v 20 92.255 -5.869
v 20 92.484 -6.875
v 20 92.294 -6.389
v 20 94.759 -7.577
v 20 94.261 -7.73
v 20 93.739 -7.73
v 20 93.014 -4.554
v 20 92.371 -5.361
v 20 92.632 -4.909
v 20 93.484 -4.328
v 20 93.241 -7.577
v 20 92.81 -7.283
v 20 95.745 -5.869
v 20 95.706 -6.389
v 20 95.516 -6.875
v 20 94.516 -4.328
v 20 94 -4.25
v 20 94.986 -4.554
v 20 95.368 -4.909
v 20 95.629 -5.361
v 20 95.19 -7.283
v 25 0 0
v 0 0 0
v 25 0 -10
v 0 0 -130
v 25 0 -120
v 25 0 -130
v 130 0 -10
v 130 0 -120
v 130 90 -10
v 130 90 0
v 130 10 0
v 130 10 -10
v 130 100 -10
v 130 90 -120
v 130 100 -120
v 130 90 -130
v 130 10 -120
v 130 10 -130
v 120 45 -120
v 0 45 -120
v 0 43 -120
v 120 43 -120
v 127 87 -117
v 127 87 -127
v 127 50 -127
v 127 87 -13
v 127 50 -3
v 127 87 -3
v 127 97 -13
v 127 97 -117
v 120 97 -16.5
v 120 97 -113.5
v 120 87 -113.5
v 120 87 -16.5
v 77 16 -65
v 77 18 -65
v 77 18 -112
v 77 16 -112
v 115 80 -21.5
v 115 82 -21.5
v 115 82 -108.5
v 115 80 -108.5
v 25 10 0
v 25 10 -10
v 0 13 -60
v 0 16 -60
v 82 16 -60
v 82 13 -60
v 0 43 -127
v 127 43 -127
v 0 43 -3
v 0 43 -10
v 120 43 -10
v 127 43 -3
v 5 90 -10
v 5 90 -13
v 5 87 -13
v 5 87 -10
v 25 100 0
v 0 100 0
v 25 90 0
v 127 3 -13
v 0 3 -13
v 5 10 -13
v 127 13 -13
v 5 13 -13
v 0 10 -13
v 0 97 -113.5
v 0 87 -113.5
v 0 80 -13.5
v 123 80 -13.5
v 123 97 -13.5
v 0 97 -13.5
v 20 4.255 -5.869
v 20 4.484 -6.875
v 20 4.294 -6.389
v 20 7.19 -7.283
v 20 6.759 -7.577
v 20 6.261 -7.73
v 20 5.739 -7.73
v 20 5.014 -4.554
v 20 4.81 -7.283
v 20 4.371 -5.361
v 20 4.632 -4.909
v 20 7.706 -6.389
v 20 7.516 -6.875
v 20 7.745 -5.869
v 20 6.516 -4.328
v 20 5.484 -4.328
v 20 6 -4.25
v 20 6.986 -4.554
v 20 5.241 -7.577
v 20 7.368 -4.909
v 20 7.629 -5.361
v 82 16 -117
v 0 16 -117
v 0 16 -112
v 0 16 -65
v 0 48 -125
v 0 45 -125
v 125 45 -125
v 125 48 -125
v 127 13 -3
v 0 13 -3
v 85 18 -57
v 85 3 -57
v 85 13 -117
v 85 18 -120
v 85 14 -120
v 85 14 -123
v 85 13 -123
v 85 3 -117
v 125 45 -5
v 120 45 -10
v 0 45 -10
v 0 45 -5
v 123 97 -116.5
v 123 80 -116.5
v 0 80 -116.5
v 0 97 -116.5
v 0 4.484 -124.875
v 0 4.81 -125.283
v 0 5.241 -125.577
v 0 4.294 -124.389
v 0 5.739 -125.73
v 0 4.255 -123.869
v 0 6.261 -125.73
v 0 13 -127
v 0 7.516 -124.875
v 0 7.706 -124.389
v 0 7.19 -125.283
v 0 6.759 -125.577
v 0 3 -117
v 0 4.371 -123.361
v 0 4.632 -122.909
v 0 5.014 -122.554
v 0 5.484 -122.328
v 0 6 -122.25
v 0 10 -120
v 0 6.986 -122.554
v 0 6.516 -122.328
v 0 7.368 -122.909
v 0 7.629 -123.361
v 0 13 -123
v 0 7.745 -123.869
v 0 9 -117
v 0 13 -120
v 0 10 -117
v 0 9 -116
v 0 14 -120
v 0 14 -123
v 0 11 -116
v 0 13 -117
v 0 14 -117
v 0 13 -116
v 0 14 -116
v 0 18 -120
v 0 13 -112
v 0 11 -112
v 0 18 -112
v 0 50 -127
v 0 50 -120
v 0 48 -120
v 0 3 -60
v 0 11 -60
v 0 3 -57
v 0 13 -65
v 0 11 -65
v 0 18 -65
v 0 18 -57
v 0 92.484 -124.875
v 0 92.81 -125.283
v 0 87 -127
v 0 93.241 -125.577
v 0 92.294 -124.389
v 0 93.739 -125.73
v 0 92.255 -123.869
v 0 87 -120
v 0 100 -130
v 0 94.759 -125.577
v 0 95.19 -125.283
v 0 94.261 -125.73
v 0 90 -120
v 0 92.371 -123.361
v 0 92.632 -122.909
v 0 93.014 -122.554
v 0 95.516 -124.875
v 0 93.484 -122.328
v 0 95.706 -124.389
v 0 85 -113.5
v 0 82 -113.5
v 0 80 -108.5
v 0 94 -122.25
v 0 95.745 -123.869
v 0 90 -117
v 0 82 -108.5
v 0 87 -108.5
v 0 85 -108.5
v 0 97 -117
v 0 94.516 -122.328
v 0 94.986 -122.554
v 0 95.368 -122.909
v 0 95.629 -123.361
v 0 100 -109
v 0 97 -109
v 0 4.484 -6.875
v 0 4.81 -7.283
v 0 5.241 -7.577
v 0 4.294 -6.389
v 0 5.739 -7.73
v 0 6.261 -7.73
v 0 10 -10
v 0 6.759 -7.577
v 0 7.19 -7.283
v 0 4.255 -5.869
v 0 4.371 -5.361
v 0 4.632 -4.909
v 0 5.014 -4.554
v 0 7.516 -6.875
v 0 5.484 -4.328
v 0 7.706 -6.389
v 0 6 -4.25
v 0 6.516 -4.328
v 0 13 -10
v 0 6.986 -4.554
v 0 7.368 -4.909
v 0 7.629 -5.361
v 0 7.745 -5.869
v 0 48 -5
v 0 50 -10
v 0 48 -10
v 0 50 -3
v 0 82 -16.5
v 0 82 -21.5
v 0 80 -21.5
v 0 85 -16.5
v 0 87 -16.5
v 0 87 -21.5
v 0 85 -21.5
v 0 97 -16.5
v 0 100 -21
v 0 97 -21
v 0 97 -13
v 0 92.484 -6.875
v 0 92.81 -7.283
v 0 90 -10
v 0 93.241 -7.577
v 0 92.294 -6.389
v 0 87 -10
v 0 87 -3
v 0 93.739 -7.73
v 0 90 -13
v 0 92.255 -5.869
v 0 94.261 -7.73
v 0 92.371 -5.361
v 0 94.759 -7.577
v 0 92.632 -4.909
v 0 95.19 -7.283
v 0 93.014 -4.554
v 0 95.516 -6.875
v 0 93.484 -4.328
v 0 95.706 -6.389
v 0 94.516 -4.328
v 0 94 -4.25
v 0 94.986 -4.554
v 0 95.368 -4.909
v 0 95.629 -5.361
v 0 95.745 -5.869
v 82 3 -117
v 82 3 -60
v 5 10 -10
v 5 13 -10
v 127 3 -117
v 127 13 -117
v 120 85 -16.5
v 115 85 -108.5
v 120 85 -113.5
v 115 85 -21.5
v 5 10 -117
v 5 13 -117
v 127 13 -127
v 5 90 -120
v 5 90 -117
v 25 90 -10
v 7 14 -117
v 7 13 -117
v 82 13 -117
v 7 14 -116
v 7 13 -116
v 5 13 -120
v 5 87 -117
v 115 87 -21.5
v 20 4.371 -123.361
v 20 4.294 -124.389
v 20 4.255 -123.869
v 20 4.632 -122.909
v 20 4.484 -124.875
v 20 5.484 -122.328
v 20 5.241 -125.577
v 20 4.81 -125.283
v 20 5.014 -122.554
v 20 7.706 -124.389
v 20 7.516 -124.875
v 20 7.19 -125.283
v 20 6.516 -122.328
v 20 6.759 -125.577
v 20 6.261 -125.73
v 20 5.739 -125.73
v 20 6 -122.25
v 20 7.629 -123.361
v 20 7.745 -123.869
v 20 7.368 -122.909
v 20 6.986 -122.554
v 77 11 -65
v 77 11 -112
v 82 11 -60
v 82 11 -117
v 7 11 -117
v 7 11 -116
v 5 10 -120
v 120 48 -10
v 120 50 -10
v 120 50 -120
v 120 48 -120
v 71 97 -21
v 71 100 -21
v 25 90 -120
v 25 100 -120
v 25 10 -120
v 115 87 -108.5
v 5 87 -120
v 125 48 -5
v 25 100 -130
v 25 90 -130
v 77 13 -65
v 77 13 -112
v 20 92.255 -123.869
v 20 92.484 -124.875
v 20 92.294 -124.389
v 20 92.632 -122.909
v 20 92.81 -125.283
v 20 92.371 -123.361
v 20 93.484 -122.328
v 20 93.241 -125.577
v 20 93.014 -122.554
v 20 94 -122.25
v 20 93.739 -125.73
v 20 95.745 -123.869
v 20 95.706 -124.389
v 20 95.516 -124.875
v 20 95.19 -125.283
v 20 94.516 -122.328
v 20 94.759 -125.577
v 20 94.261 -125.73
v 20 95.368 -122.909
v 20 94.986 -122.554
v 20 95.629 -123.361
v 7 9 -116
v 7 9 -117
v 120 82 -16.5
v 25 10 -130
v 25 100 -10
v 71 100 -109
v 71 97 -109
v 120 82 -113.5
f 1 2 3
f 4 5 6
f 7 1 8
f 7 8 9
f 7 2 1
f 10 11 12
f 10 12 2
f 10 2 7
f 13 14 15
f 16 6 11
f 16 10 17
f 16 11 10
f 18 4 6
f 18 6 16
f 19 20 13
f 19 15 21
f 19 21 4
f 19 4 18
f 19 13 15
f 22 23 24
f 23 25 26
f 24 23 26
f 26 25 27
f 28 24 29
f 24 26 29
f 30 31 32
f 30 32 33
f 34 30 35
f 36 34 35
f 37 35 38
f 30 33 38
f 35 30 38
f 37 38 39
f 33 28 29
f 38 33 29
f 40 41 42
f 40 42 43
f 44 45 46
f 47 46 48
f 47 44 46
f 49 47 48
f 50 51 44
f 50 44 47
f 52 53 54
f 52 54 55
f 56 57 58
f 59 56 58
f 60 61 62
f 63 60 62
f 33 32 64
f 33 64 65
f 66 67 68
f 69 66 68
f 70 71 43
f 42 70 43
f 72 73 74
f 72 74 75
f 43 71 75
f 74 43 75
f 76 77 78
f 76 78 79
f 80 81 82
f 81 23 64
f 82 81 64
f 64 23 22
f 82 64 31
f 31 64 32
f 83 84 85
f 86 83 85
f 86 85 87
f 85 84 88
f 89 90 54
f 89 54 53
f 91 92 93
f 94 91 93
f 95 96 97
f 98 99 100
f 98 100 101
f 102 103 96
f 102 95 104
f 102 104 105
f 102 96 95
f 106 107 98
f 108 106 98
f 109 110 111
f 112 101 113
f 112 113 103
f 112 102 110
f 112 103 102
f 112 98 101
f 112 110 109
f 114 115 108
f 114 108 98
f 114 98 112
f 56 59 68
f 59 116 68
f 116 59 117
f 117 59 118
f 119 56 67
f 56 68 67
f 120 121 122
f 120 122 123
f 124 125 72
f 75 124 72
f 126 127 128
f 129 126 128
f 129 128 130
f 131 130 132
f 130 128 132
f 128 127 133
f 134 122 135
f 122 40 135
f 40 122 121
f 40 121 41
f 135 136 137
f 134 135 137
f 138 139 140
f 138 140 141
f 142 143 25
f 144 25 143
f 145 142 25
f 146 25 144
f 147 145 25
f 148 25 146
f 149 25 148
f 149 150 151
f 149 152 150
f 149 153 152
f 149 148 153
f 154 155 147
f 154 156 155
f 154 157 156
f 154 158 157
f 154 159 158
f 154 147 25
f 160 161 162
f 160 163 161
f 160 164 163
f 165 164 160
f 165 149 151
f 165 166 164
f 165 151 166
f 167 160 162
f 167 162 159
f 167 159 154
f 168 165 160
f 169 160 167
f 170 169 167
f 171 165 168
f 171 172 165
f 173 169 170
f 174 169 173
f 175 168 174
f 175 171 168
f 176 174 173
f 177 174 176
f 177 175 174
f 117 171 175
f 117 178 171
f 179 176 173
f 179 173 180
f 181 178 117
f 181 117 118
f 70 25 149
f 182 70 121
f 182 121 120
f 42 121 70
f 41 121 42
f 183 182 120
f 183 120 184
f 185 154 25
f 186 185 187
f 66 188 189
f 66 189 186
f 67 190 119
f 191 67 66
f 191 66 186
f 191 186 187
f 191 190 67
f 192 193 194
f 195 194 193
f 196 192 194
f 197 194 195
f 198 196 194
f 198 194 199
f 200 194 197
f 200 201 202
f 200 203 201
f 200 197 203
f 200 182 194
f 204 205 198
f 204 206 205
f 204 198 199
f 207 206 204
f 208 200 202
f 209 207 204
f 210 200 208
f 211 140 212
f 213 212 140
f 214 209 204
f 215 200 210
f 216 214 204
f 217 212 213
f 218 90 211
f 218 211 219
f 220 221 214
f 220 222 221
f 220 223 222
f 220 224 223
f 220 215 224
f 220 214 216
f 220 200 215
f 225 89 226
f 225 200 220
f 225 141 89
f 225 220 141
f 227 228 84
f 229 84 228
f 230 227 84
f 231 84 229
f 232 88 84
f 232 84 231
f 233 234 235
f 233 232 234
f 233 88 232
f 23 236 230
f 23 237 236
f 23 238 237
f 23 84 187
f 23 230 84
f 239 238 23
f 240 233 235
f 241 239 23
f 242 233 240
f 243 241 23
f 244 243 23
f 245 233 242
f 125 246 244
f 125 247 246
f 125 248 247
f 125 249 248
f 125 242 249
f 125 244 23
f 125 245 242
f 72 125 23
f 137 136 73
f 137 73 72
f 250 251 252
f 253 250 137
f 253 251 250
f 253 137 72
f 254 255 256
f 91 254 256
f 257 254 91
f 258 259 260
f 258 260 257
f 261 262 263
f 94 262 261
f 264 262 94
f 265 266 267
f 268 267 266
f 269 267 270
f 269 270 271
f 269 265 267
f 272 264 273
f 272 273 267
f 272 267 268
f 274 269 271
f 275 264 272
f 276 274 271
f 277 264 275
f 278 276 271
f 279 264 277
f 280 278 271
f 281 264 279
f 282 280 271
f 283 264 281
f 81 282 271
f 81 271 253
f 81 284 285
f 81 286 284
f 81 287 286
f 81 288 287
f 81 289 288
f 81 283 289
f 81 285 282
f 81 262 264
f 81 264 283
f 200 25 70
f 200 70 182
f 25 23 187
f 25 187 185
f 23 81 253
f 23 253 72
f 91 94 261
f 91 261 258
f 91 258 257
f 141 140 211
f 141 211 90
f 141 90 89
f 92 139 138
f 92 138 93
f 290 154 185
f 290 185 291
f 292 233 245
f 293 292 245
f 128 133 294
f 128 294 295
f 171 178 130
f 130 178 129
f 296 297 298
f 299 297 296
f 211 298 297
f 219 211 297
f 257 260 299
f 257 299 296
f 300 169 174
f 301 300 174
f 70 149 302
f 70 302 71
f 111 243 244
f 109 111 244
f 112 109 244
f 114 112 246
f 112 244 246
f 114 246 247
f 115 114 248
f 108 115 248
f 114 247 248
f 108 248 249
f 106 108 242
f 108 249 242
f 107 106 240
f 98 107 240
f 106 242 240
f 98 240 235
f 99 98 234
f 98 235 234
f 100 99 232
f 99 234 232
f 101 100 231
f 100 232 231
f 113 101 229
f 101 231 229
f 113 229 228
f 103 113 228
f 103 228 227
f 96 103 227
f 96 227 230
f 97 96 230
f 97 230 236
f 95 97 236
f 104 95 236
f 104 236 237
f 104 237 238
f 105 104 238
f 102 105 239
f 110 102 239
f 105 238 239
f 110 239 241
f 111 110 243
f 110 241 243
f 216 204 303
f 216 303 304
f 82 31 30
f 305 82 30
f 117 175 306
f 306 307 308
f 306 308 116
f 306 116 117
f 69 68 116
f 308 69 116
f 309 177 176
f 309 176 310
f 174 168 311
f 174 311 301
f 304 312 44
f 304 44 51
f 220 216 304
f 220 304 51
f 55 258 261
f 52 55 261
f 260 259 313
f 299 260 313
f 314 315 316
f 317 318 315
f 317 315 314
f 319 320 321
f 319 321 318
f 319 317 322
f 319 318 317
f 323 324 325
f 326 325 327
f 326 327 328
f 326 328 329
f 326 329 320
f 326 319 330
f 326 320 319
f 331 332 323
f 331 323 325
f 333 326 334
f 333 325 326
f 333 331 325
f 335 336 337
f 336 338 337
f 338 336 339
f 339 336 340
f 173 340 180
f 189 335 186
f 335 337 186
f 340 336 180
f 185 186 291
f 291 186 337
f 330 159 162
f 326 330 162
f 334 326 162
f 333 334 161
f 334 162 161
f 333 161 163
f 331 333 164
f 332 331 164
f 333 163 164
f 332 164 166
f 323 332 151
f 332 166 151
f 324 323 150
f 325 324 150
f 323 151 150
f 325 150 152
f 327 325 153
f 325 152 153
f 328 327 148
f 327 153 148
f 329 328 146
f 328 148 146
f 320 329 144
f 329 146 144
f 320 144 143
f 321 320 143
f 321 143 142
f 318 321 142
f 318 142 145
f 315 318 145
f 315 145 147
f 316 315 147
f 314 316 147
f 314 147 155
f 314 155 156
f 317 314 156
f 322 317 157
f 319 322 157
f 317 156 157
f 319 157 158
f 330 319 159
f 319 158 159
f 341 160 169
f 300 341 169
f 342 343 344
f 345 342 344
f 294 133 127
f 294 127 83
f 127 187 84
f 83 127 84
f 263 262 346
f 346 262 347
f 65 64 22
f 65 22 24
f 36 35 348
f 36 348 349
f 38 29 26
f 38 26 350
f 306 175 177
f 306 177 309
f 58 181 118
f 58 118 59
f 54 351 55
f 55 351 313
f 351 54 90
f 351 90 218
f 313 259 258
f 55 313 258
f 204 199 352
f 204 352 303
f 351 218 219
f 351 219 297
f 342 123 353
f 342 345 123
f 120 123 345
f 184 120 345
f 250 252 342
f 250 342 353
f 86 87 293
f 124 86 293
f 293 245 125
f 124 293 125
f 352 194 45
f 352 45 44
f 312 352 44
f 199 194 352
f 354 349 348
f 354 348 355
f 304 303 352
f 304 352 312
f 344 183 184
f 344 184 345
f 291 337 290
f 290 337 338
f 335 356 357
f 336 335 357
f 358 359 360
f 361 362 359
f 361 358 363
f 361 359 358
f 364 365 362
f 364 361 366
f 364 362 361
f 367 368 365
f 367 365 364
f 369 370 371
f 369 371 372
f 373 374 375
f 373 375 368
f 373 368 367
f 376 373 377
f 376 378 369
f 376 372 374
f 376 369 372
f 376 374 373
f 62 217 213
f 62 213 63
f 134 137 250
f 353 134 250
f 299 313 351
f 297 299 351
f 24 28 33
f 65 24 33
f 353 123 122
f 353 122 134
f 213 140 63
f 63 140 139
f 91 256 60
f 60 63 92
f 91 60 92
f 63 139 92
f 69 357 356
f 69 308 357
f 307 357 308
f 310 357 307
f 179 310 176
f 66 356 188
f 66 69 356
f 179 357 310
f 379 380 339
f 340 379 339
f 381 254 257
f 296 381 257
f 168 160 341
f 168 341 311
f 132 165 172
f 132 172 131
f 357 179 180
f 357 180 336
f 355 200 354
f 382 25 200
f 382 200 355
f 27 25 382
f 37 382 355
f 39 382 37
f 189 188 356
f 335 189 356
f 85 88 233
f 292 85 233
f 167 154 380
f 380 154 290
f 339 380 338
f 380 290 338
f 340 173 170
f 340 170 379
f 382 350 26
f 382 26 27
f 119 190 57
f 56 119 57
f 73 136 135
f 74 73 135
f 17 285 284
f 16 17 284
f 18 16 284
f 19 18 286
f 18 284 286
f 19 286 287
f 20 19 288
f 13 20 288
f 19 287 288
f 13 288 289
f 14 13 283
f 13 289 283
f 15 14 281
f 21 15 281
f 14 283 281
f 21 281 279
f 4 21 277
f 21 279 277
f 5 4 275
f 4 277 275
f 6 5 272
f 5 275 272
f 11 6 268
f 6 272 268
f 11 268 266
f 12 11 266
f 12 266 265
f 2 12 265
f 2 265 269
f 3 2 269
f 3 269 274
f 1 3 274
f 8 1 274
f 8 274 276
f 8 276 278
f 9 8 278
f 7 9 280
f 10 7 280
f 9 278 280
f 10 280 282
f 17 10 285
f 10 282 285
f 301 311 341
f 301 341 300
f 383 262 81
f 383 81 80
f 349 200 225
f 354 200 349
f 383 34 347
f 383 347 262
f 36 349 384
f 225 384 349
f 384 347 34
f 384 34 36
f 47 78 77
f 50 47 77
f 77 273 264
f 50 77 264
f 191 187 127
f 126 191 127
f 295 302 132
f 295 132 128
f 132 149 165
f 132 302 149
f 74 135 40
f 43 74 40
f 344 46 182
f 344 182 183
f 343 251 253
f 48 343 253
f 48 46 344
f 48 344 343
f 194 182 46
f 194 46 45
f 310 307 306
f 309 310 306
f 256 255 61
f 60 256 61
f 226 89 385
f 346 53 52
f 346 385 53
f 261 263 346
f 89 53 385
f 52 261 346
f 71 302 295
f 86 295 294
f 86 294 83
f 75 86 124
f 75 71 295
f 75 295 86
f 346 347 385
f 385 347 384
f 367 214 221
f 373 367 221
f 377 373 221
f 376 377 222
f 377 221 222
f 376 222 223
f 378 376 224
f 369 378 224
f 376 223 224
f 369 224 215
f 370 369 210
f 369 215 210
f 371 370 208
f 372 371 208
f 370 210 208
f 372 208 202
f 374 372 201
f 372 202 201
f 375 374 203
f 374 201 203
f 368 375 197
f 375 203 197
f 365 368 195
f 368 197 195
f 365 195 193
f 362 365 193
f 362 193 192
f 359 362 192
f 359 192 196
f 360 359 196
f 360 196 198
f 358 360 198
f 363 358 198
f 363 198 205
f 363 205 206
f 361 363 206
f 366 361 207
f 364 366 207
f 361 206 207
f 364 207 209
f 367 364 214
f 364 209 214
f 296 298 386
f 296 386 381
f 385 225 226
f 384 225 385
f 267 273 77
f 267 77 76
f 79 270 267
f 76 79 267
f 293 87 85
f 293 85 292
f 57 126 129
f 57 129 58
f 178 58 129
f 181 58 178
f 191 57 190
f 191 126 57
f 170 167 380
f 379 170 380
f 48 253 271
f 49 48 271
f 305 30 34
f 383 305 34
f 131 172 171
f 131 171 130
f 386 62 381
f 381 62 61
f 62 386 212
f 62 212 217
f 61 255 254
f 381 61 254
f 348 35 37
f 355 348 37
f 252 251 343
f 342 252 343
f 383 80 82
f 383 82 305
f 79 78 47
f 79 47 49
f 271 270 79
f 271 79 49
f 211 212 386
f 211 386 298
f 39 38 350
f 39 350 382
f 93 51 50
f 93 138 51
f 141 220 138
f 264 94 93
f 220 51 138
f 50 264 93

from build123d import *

# Parameters (mm, degrees)
SKETCH2_W            = 130
SKETCH2_H            = 130
BOSS_EXTRUDE1_DEPTH  = 100
SKETCH3_W            = 104
SKETCH3_H            = 74
CUT_EXTRUDE1_DEPTH   = 127
SKETCH4_W            = 10
SKETCH4_H            = 10
CUT_EXTRUDE3_DEPTH   = 105
SKETCH5_W            = 104
SKETCH5_H            = 10
CUT_EXTRUDE4_DEPTH   = 127
SKETCH6_W            = 10
SKETCH6_H            = 74
CUT_EXTRUDE5_DEPTH   = 127
SKETCH7_R            = 1.75
CUT_EXTRUDE6_DEPTH   = 20
SKETCH8_W            = 3
SKETCH8_H            = 3
CUT_EXTRUDE7_DEPTH   = 5
SKETCH9_W            = 85
SKETCH9_H            = 60
BOSS_EXTRUDE2_DEPTH  = 15
SKETCH11_W           = 85
SKETCH11_H           = 6
BOSS_EXTRUDE5_DEPTH  = 5
SKETCH12_W           = 85
SKETCH12_H           = 3
CUT_EXTRUDE9_DEPTH   = 4
SKETCH13_W           = 82
SKETCH13_H           = 57
CUT_EXTRUDE10_DEPTH  = 15
SKETCH15_W           = 3
SKETCH15_H           = 3
BOSS_EXTRUDE7_DEPTH  = 5
SKETCH16_W           = 82
SKETCH16_H           = 2
BOSS_EXTRUDE8_DEPTH  = 57
SKETCH17_W           = 77
SKETCH17_H           = 47
CUT_EXTRUDE11_DEPTH  = 10
SKETCH19_W           = 7
SKETCH19_H           = 2
SKETCH19_H_2         = 1
BOSS_EXTRUDE9_DEPTH  = 1
SKETCH21_W           = 3
SKETCH21_H           = 3
CUT_EXTRUDE15_DEPTH  = 5
SKETCH22_W           = 124
SKETCH22_H           = 7
BOSS_EXTRUDE10_DEPTH = 127
SKETCH23_W           = 120
SKETCH23_H           = 3
CUT_EXTRUDE16_DEPTH  = 125
SKETCH24_W           = 120
SKETCH24_H           = 110
CUT_EXTRUDE17_DEPTH  = 15
SKETCH25_W           = 71
SKETCH25_H           = 88
CUT_EXTRUDE18_DEPTH  = 15
SKETCH27_W           = 103
SKETCH27_H           = 17
BOSS_EXTRUDE11_DEPTH = 127
SKETCH28_W           = 97
SKETCH28_H           = 3
SKETCH28_H_2         = 10
CUT_EXTRUDE19_DEPTH  = 120
SKETCH29_W           = 4
SKETCH29_H           = 103
CUT_EXTRUDE20_DEPTH  = 17
SKETCH30_W           = 115
SKETCH30_H           = 87
CUT_EXTRUDE21_DEPTH  = 17


with BuildPart() as part:
    # Sketch2 → Boss-Extrude1 (new body)
    with BuildSketch(Plane(origin=(0, 0, 0), x_dir=(1, 0, 0), z_dir=(0, 1, 0))):
        with Locations((65, 65)):
            Rectangle(SKETCH2_W, SKETCH2_H)
    extrude(amount=BOSS_EXTRUDE1_DEPTH)

    # Sketch3 → Cut-Extrude1 (cut)
    with BuildSketch(Plane.ZY):
        with Locations((-65, 50)):
            Rectangle(SKETCH3_W, SKETCH3_H)
    extrude(amount=-CUT_EXTRUDE1_DEPTH, mode=Mode.SUBTRACT)

    # Sketch4 → Cut-Extrude3 (cut)
    with BuildSketch(Plane(origin=(130, 0, 0), x_dir=(0, 0, -1), z_dir=(1, 0, 0))):
        with Locations((5, 95)):
            Rectangle(SKETCH4_W, SKETCH4_H)
        with Locations((125, 95)):
            Rectangle(SKETCH4_W, SKETCH4_H)
        with Locations((5, 5)):
            Rectangle(SKETCH4_W, SKETCH4_H)
        with Locations((125, 5)):
            Rectangle(SKETCH4_W, SKETCH4_H)
    extrude(amount=-CUT_EXTRUDE3_DEPTH, mode=Mode.SUBTRACT)

    # Sketch5 → Cut-Extrude4 (cut)
    with BuildSketch(Plane.ZY):
        with Locations((-65, 92)):
            Rectangle(SKETCH5_W, SKETCH5_H)
        with Locations((-65, 8)):
            Rectangle(SKETCH5_W, SKETCH5_H)
    extrude(amount=-CUT_EXTRUDE4_DEPTH, mode=Mode.SUBTRACT)

    # Sketch6 → Cut-Extrude5 (cut)
    with BuildSketch(Plane.ZY):
        with Locations((-122, 50)):
            Rectangle(SKETCH6_W, SKETCH6_H)
        with Locations((-8, 50)):
            Rectangle(SKETCH6_W, SKETCH6_H)
    extrude(amount=-CUT_EXTRUDE5_DEPTH, mode=Mode.SUBTRACT)

    # Sketch7 → Cut-Extrude6 (cut)
    with BuildSketch(Plane.ZY):
        with Locations((-124, 94)):
            Circle(SKETCH7_R)
        with Locations((-6, 94)):
            Circle(SKETCH7_R)
        with Locations((-124, 6)):
            Circle(SKETCH7_R)
        with Locations((-6, 6)):
            Circle(SKETCH7_R)
    extrude(amount=-CUT_EXTRUDE6_DEPTH, mode=Mode.SUBTRACT)

    # Sketch8 → Cut-Extrude7 (cut)
    with BuildSketch(Plane.ZY):
        with Locations((-118.5, 88.5)):
            Rectangle(SKETCH8_W, SKETCH8_H)
        with Locations((-11.5, 88.5)):
            Rectangle(SKETCH8_W, SKETCH8_H)
        with Locations((-118.5, 11.5)):
            Rectangle(SKETCH8_W, SKETCH8_H)
        with Locations((-11.5, 11.5)):
            Rectangle(SKETCH8_W, SKETCH8_H)
    extrude(amount=-CUT_EXTRUDE7_DEPTH, mode=Mode.SUBTRACT)

    # Sketch9 → Boss-Extrude2 (add)
    with BuildSketch(Plane(origin=(0, 3, 0), x_dir=(1, 0, 0), z_dir=(0, 1, 0))):
        with Locations((42.5, 87)):
            Rectangle(SKETCH9_W, SKETCH9_H)
    extrude(amount=BOSS_EXTRUDE2_DEPTH)

    # Sketch11 → Boss-Extrude5 (add)
    with BuildSketch(Plane(origin=(0, 13, 0), x_dir=(1, 0, 0), z_dir=(0, 1, 0))):
        with Locations((42.5, 120)):
            Rectangle(SKETCH11_W, SKETCH11_H)
    extrude(amount=BOSS_EXTRUDE5_DEPTH)

    # Sketch12 → Cut-Extrude9 (cut)
    with BuildSketch(Plane(origin=(0, 18, 0), x_dir=(1, 0, 0), z_dir=(0, 1, 0))):
        with Locations((42.5, 121.5)):
            Rectangle(SKETCH12_W, SKETCH12_H)
    extrude(amount=-CUT_EXTRUDE9_DEPTH, mode=Mode.SUBTRACT)

    # Sketch13 → Cut-Extrude10 (cut)
    with BuildSketch(Plane(origin=(0, 18, 0), x_dir=(1, 0, 0), z_dir=(0, 1, 0))):
        with Locations((41, 88.5)):
            Rectangle(SKETCH13_W, SKETCH13_H)
    extrude(amount=-CUT_EXTRUDE10_DEPTH, mode=Mode.SUBTRACT)

    # Sketch15 → Boss-Extrude7 (add)
    with BuildSketch(Plane.ZY.offset(-5)):
        with Locations((-118.5, 11.5)):
            Rectangle(SKETCH15_W, SKETCH15_H)
    extrude(amount=BOSS_EXTRUDE7_DEPTH)

    # Sketch16 → Boss-Extrude8 (add)
    with BuildSketch(Plane(origin=(0, 0, -60), x_dir=(-1, 0, 0), z_dir=(0, 0, -1))):
        with Locations((-41, 17)):
            Rectangle(SKETCH16_W, SKETCH16_H)
        with Locations((-41, 12)):
            Rectangle(SKETCH16_W, SKETCH16_H)
    extrude(amount=BOSS_EXTRUDE8_DEPTH)

    # Sketch17 → Cut-Extrude11 (cut)
    with BuildSketch(Plane(origin=(0, 18, 0), x_dir=(1, 0, 0), z_dir=(0, 1, 0))):
        with Locations((38.5, 88.5)):
            Rectangle(SKETCH17_W, SKETCH17_H)
    extrude(amount=-CUT_EXTRUDE11_DEPTH, mode=Mode.SUBTRACT)

    # Sketch19 → Boss-Extrude9 (add)
    with BuildSketch(Plane.XY.offset(-117)):
        with Locations((3.5, 10)):
            Rectangle(SKETCH19_W, SKETCH19_H)
        with Locations((3.5, 13.5)):
            Rectangle(SKETCH19_W, SKETCH19_H_2)
    extrude(amount=BOSS_EXTRUDE9_DEPTH)

    # Sketch21 → Cut-Extrude15 (cut)
    with BuildSketch(Plane.ZY):
        with Locations((-118.5, 11.5)):
            Rectangle(SKETCH21_W, SKETCH21_H)
    extrude(amount=-CUT_EXTRUDE15_DEPTH, mode=Mode.SUBTRACT)

    # Sketch22 → Boss-Extrude10 (add)
    with BuildSketch(Plane.ZY.offset(-127)):
        with Locations((-65, 46.5)):
            Rectangle(SKETCH22_W, SKETCH22_H)
    extrude(amount=BOSS_EXTRUDE10_DEPTH)

    # Sketch23 → Cut-Extrude16 (cut)
    with BuildSketch(Plane.ZY):
        with Locations((-65, 46.5)):
            Rectangle(SKETCH23_W, SKETCH23_H)
    extrude(amount=-CUT_EXTRUDE16_DEPTH, mode=Mode.SUBTRACT)

    # Sketch24 → Cut-Extrude17 (cut)
    with BuildSketch(Plane(origin=(0, 50, 0), x_dir=(1, 0, 0), z_dir=(0, 1, 0))):
        with Locations((60, 65)):
            Rectangle(SKETCH24_W, SKETCH24_H)
    extrude(amount=-CUT_EXTRUDE17_DEPTH, mode=Mode.SUBTRACT)

    # Sketch25 → Cut-Extrude18 (cut)
    with BuildSketch(Plane(origin=(0, 100, 0), x_dir=(1, 0, 0), z_dir=(0, 1, 0))):
        with Locations((35.5, 65)):
            Rectangle(SKETCH25_W, SKETCH25_H)
    extrude(amount=-CUT_EXTRUDE18_DEPTH, mode=Mode.SUBTRACT)

    # Sketch27 → Boss-Extrude11 (add)
    with BuildSketch(Plane.ZY.offset(-127)):
        with Locations((-65, 88.5)):
            Rectangle(SKETCH27_W, SKETCH27_H)
    extrude(amount=BOSS_EXTRUDE11_DEPTH)

    # Sketch28 → Cut-Extrude19 (cut)
    with BuildSketch(Plane.ZY):
        with Locations((-65, 83.5)):
            Rectangle(SKETCH28_W, SKETCH28_H)
        with Locations((-65, 92)):
            Rectangle(SKETCH28_W, SKETCH28_H_2)
    extrude(amount=-CUT_EXTRUDE19_DEPTH, mode=Mode.SUBTRACT)

    # Sketch29 → Cut-Extrude20 (cut)
    with BuildSketch(Plane.XZ.offset(-80)):
        with Locations((125, -65)):
            Rectangle(SKETCH29_W, SKETCH29_H)
    extrude(amount=-CUT_EXTRUDE20_DEPTH, mode=Mode.SUBTRACT)

    # Sketch30 → Cut-Extrude21 (cut)
    with BuildSketch(Plane(origin=(0, 87, 0), x_dir=(1, 0, 0), z_dir=(0, 1, 0))):
        with Locations((57.5, 65)):
            Rectangle(SKETCH30_W, SKETCH30_H)
    extrude(amount=-CUT_EXTRUDE21_DEPTH, mode=Mode.SUBTRACT)


solid = part.part
